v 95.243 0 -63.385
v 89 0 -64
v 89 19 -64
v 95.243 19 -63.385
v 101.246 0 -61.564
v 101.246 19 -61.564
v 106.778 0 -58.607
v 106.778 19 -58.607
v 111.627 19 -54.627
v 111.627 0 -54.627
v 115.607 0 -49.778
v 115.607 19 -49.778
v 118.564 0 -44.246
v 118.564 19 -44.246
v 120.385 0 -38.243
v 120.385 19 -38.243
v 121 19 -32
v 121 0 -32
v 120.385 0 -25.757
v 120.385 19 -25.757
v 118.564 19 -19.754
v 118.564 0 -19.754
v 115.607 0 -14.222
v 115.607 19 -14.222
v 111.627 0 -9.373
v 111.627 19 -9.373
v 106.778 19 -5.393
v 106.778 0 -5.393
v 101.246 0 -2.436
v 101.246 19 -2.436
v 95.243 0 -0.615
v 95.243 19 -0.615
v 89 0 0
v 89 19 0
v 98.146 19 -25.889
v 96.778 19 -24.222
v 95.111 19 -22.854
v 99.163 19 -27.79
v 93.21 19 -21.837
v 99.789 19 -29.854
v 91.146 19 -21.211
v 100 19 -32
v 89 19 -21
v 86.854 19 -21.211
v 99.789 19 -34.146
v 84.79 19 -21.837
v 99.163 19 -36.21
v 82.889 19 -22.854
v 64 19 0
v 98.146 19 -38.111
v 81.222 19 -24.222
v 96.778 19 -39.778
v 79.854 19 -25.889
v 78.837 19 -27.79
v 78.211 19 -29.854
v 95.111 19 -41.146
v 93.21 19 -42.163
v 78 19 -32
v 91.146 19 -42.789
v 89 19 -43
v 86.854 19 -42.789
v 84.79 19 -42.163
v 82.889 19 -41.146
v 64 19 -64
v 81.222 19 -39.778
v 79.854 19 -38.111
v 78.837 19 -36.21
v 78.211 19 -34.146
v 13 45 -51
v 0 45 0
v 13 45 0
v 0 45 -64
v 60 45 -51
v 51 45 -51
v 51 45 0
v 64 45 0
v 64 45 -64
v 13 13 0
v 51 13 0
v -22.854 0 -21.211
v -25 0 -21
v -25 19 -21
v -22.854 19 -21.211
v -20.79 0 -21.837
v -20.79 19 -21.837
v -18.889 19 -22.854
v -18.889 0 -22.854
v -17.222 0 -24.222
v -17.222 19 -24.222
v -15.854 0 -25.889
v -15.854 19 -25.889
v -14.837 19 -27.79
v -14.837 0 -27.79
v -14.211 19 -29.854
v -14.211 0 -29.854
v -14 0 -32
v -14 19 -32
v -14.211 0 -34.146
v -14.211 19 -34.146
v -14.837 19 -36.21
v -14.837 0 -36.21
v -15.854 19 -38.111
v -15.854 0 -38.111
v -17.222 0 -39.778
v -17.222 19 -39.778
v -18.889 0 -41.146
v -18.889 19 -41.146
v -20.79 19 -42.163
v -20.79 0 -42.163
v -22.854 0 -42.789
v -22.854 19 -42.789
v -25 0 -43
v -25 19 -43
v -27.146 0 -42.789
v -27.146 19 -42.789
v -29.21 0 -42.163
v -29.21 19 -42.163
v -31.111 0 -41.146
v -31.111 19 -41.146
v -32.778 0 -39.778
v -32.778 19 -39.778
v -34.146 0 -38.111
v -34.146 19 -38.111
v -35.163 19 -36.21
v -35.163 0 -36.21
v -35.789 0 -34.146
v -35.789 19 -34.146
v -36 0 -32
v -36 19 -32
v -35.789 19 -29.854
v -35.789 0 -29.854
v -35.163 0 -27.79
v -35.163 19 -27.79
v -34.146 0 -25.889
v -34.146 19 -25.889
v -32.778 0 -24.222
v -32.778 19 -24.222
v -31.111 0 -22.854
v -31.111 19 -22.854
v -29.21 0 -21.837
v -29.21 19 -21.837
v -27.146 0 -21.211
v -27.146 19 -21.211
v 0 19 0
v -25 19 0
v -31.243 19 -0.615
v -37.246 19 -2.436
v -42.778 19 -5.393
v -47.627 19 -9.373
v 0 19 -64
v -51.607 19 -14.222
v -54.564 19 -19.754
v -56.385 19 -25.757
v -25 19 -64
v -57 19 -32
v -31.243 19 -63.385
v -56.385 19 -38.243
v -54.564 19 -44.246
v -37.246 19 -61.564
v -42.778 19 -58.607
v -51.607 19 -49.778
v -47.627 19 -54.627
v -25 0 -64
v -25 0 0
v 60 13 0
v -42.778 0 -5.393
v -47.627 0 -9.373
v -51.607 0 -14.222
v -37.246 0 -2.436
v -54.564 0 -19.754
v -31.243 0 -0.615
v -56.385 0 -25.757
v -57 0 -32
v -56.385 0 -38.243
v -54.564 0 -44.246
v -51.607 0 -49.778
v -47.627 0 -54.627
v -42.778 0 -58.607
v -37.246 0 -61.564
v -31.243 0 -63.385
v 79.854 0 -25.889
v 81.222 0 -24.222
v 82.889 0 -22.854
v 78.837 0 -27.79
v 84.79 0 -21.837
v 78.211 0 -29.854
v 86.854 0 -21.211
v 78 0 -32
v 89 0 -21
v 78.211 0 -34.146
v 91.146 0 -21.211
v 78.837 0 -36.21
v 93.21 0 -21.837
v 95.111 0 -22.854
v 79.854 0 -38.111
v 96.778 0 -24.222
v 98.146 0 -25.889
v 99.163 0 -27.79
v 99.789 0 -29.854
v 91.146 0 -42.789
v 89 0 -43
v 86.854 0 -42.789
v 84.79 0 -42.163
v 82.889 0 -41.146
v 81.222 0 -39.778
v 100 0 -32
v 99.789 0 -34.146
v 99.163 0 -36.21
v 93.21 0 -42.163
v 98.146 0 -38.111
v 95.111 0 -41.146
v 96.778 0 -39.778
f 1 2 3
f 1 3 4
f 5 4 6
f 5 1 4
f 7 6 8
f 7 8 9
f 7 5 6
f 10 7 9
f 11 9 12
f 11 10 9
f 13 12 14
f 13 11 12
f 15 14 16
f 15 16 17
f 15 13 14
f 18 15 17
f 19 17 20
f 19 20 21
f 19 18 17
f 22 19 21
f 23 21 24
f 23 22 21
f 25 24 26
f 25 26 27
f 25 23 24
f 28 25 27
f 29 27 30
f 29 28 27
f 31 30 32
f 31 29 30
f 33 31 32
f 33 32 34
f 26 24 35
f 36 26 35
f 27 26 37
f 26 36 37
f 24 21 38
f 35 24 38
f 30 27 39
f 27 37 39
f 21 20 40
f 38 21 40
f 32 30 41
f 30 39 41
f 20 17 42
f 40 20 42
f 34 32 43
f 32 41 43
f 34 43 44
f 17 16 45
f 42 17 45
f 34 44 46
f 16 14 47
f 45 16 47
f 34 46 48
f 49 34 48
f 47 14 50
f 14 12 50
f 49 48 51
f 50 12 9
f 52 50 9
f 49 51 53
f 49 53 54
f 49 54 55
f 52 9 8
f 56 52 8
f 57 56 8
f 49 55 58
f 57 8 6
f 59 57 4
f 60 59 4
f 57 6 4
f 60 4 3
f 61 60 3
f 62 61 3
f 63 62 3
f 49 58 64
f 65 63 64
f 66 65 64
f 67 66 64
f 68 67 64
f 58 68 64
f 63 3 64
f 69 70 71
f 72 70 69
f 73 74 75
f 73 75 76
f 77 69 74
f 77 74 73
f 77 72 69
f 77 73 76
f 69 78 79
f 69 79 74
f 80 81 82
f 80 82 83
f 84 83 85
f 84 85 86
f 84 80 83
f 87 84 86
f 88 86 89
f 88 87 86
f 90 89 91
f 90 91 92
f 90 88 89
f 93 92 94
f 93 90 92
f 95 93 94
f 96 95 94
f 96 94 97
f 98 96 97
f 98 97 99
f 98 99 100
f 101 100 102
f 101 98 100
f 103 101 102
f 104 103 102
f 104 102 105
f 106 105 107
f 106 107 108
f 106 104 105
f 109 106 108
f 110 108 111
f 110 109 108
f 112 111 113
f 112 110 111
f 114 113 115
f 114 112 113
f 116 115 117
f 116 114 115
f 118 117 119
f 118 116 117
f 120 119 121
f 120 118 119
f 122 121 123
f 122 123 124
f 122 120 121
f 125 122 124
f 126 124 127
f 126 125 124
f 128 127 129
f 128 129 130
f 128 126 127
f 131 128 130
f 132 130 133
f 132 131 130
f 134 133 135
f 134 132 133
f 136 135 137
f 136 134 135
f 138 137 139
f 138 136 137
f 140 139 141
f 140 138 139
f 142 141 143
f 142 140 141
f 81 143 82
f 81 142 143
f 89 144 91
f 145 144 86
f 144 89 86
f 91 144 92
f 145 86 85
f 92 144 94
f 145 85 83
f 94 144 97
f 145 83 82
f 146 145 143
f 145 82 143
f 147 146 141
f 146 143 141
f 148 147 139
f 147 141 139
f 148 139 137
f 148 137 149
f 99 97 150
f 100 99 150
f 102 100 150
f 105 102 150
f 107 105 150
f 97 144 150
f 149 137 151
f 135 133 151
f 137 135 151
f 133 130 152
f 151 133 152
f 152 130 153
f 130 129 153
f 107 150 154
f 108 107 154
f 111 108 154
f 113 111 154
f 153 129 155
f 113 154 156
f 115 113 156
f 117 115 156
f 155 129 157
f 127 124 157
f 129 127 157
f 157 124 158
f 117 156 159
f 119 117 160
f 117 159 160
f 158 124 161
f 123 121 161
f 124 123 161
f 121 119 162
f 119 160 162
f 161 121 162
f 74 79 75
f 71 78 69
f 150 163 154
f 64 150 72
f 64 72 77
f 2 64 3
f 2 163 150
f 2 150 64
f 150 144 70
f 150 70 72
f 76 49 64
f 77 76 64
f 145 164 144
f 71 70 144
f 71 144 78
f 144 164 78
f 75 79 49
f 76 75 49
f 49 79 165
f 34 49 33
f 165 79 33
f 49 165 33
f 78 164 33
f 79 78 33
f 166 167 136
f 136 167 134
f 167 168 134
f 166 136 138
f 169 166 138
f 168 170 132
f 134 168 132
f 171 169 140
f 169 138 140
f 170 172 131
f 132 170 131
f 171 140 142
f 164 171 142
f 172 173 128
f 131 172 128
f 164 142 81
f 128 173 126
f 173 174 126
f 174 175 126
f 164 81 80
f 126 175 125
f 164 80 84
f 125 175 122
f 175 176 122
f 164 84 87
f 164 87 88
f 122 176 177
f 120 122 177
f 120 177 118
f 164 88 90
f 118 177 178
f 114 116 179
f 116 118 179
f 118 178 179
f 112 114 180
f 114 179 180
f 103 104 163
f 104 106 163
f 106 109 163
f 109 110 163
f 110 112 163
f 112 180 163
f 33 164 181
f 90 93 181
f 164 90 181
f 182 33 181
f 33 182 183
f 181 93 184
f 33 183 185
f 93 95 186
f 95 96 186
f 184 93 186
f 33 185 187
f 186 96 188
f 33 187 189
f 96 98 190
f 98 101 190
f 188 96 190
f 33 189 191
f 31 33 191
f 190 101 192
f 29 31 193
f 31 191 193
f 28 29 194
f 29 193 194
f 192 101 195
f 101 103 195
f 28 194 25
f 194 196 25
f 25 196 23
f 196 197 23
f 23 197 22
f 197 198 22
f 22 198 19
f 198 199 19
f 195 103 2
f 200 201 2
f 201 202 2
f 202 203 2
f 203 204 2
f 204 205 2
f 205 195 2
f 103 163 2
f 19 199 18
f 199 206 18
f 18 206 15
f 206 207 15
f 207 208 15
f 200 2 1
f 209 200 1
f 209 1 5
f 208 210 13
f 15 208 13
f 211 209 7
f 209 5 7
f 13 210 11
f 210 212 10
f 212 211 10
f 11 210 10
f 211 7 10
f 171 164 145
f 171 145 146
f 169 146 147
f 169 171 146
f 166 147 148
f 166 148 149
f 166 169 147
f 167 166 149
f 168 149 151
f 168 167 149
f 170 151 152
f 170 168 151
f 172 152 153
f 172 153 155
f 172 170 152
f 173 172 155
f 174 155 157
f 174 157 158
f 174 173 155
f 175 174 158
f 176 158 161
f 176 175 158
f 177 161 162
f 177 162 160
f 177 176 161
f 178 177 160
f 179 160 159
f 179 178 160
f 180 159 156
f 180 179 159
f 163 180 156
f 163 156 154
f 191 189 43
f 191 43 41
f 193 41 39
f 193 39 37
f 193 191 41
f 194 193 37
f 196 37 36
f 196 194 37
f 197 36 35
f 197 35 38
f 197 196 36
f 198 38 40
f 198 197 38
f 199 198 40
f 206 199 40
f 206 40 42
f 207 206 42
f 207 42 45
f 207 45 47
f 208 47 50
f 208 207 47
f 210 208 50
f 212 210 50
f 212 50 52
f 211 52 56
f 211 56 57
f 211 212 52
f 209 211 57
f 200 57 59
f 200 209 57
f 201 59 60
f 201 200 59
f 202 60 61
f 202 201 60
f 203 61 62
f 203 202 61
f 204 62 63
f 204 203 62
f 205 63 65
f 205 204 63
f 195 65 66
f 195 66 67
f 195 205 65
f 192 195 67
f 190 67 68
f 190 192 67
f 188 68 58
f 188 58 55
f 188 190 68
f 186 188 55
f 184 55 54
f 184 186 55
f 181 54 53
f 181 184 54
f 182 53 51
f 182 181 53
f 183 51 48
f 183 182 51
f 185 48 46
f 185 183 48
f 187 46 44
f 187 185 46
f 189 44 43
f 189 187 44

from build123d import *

# Parameters (mm, degrees)
SKETCH1_W           = 64
SKETCH1_H           = 64
BOSS_EXTRUDE1_DEPTH = 45
SKETCH2_R           = 11
BOSS_EXTRUDE4_DEPTH = 19
SKETCH10_W          = 38
SKETCH10_H          = 51
CUT_EXTRUDE5_DEPTH  = 63
SKETCH12_W          = 38
SKETCH12_H          = 51
BOSS_EXTRUDE5_DEPTH = 13
BOSS_EXTRUDE6_DEPTH = 47


with BuildPart() as part:
    # Sketch1 → Boss-Extrude1 (new body)
    with BuildSketch(Plane(origin=(0, 0, 0), x_dir=(1, 0, 0), z_dir=(0, 1, 0))):
        with Locations((32, 32)):
            Rectangle(SKETCH1_W, SKETCH1_H)
    extrude(amount=BOSS_EXTRUDE1_DEPTH)

    # Sketch2 → Boss-Extrude4 (add)
    # profile 1 of 2: a face of its own
    with BuildSketch(Plane(origin=(0, 0, 0), x_dir=(1, 0, 0), z_dir=(0, 1, 0))):
        with BuildLine():
            Line((0, 64), (0, 0))
            Line((0, 0), (-25, 0))
            ThreePointArc((-25, 0), (-57, 32), (-25, 64))
            Line((-25, 64), (0, 64))
        make_face()
        with Locations(Location((-25, 32, 0), (0, 0, 270))):
            Circle(SKETCH2_R, mode=Mode.SUBTRACT)
    # profile 2 of 2: a face of its own
    with BuildSketch(Plane(origin=(0, 0, 0), x_dir=(1, 0, 0), z_dir=(0, 1, 0))):
        with BuildLine():
            Line((89, 0), (64, 0))
            Line((64, 0), (64, 64))
            Line((64, 64), (89, 64))
            ThreePointArc((89, 64), (121, 32), (89, 0))
        make_face()
        with Locations(Location((89, 32, 0), (0, 0, 270))):
            Circle(SKETCH2_R, mode=Mode.SUBTRACT)
    extrude(amount=BOSS_EXTRUDE4_DEPTH)

    # Sketch10 → Cut-Extrude5 (cut)
    with BuildSketch(Plane(origin=(0, 0, 0), x_dir=(1, 0, 0), z_dir=(0, 1, 0))):
        with Locations((32, 25.5)):
            Rectangle(SKETCH10_W, SKETCH10_H)
    extrude(amount=CUT_EXTRUDE5_DEPTH, mode=Mode.SUBTRACT)

    # Sketch12 → Boss-Extrude5 (add)
    with BuildSketch(Plane(origin=(0, 0, 0), x_dir=(1, 0, 0), z_dir=(0, 1, 0))):
        with Locations((32, 25.5)):
            Rectangle(SKETCH12_W, SKETCH12_H)
    extrude(amount=BOSS_EXTRUDE5_DEPTH)

    # Sketch13 → Boss-Extrude6 (add)
    with BuildSketch(Plane(origin=(13, 0, 0), x_dir=(0, 0, -1), z_dir=(1, 0, 0))):
        Polygon((0, 13), (51, 45), (51, 13), align=None)
    extrude(amount=BOSS_EXTRUDE6_DEPTH)


solid = part.part
